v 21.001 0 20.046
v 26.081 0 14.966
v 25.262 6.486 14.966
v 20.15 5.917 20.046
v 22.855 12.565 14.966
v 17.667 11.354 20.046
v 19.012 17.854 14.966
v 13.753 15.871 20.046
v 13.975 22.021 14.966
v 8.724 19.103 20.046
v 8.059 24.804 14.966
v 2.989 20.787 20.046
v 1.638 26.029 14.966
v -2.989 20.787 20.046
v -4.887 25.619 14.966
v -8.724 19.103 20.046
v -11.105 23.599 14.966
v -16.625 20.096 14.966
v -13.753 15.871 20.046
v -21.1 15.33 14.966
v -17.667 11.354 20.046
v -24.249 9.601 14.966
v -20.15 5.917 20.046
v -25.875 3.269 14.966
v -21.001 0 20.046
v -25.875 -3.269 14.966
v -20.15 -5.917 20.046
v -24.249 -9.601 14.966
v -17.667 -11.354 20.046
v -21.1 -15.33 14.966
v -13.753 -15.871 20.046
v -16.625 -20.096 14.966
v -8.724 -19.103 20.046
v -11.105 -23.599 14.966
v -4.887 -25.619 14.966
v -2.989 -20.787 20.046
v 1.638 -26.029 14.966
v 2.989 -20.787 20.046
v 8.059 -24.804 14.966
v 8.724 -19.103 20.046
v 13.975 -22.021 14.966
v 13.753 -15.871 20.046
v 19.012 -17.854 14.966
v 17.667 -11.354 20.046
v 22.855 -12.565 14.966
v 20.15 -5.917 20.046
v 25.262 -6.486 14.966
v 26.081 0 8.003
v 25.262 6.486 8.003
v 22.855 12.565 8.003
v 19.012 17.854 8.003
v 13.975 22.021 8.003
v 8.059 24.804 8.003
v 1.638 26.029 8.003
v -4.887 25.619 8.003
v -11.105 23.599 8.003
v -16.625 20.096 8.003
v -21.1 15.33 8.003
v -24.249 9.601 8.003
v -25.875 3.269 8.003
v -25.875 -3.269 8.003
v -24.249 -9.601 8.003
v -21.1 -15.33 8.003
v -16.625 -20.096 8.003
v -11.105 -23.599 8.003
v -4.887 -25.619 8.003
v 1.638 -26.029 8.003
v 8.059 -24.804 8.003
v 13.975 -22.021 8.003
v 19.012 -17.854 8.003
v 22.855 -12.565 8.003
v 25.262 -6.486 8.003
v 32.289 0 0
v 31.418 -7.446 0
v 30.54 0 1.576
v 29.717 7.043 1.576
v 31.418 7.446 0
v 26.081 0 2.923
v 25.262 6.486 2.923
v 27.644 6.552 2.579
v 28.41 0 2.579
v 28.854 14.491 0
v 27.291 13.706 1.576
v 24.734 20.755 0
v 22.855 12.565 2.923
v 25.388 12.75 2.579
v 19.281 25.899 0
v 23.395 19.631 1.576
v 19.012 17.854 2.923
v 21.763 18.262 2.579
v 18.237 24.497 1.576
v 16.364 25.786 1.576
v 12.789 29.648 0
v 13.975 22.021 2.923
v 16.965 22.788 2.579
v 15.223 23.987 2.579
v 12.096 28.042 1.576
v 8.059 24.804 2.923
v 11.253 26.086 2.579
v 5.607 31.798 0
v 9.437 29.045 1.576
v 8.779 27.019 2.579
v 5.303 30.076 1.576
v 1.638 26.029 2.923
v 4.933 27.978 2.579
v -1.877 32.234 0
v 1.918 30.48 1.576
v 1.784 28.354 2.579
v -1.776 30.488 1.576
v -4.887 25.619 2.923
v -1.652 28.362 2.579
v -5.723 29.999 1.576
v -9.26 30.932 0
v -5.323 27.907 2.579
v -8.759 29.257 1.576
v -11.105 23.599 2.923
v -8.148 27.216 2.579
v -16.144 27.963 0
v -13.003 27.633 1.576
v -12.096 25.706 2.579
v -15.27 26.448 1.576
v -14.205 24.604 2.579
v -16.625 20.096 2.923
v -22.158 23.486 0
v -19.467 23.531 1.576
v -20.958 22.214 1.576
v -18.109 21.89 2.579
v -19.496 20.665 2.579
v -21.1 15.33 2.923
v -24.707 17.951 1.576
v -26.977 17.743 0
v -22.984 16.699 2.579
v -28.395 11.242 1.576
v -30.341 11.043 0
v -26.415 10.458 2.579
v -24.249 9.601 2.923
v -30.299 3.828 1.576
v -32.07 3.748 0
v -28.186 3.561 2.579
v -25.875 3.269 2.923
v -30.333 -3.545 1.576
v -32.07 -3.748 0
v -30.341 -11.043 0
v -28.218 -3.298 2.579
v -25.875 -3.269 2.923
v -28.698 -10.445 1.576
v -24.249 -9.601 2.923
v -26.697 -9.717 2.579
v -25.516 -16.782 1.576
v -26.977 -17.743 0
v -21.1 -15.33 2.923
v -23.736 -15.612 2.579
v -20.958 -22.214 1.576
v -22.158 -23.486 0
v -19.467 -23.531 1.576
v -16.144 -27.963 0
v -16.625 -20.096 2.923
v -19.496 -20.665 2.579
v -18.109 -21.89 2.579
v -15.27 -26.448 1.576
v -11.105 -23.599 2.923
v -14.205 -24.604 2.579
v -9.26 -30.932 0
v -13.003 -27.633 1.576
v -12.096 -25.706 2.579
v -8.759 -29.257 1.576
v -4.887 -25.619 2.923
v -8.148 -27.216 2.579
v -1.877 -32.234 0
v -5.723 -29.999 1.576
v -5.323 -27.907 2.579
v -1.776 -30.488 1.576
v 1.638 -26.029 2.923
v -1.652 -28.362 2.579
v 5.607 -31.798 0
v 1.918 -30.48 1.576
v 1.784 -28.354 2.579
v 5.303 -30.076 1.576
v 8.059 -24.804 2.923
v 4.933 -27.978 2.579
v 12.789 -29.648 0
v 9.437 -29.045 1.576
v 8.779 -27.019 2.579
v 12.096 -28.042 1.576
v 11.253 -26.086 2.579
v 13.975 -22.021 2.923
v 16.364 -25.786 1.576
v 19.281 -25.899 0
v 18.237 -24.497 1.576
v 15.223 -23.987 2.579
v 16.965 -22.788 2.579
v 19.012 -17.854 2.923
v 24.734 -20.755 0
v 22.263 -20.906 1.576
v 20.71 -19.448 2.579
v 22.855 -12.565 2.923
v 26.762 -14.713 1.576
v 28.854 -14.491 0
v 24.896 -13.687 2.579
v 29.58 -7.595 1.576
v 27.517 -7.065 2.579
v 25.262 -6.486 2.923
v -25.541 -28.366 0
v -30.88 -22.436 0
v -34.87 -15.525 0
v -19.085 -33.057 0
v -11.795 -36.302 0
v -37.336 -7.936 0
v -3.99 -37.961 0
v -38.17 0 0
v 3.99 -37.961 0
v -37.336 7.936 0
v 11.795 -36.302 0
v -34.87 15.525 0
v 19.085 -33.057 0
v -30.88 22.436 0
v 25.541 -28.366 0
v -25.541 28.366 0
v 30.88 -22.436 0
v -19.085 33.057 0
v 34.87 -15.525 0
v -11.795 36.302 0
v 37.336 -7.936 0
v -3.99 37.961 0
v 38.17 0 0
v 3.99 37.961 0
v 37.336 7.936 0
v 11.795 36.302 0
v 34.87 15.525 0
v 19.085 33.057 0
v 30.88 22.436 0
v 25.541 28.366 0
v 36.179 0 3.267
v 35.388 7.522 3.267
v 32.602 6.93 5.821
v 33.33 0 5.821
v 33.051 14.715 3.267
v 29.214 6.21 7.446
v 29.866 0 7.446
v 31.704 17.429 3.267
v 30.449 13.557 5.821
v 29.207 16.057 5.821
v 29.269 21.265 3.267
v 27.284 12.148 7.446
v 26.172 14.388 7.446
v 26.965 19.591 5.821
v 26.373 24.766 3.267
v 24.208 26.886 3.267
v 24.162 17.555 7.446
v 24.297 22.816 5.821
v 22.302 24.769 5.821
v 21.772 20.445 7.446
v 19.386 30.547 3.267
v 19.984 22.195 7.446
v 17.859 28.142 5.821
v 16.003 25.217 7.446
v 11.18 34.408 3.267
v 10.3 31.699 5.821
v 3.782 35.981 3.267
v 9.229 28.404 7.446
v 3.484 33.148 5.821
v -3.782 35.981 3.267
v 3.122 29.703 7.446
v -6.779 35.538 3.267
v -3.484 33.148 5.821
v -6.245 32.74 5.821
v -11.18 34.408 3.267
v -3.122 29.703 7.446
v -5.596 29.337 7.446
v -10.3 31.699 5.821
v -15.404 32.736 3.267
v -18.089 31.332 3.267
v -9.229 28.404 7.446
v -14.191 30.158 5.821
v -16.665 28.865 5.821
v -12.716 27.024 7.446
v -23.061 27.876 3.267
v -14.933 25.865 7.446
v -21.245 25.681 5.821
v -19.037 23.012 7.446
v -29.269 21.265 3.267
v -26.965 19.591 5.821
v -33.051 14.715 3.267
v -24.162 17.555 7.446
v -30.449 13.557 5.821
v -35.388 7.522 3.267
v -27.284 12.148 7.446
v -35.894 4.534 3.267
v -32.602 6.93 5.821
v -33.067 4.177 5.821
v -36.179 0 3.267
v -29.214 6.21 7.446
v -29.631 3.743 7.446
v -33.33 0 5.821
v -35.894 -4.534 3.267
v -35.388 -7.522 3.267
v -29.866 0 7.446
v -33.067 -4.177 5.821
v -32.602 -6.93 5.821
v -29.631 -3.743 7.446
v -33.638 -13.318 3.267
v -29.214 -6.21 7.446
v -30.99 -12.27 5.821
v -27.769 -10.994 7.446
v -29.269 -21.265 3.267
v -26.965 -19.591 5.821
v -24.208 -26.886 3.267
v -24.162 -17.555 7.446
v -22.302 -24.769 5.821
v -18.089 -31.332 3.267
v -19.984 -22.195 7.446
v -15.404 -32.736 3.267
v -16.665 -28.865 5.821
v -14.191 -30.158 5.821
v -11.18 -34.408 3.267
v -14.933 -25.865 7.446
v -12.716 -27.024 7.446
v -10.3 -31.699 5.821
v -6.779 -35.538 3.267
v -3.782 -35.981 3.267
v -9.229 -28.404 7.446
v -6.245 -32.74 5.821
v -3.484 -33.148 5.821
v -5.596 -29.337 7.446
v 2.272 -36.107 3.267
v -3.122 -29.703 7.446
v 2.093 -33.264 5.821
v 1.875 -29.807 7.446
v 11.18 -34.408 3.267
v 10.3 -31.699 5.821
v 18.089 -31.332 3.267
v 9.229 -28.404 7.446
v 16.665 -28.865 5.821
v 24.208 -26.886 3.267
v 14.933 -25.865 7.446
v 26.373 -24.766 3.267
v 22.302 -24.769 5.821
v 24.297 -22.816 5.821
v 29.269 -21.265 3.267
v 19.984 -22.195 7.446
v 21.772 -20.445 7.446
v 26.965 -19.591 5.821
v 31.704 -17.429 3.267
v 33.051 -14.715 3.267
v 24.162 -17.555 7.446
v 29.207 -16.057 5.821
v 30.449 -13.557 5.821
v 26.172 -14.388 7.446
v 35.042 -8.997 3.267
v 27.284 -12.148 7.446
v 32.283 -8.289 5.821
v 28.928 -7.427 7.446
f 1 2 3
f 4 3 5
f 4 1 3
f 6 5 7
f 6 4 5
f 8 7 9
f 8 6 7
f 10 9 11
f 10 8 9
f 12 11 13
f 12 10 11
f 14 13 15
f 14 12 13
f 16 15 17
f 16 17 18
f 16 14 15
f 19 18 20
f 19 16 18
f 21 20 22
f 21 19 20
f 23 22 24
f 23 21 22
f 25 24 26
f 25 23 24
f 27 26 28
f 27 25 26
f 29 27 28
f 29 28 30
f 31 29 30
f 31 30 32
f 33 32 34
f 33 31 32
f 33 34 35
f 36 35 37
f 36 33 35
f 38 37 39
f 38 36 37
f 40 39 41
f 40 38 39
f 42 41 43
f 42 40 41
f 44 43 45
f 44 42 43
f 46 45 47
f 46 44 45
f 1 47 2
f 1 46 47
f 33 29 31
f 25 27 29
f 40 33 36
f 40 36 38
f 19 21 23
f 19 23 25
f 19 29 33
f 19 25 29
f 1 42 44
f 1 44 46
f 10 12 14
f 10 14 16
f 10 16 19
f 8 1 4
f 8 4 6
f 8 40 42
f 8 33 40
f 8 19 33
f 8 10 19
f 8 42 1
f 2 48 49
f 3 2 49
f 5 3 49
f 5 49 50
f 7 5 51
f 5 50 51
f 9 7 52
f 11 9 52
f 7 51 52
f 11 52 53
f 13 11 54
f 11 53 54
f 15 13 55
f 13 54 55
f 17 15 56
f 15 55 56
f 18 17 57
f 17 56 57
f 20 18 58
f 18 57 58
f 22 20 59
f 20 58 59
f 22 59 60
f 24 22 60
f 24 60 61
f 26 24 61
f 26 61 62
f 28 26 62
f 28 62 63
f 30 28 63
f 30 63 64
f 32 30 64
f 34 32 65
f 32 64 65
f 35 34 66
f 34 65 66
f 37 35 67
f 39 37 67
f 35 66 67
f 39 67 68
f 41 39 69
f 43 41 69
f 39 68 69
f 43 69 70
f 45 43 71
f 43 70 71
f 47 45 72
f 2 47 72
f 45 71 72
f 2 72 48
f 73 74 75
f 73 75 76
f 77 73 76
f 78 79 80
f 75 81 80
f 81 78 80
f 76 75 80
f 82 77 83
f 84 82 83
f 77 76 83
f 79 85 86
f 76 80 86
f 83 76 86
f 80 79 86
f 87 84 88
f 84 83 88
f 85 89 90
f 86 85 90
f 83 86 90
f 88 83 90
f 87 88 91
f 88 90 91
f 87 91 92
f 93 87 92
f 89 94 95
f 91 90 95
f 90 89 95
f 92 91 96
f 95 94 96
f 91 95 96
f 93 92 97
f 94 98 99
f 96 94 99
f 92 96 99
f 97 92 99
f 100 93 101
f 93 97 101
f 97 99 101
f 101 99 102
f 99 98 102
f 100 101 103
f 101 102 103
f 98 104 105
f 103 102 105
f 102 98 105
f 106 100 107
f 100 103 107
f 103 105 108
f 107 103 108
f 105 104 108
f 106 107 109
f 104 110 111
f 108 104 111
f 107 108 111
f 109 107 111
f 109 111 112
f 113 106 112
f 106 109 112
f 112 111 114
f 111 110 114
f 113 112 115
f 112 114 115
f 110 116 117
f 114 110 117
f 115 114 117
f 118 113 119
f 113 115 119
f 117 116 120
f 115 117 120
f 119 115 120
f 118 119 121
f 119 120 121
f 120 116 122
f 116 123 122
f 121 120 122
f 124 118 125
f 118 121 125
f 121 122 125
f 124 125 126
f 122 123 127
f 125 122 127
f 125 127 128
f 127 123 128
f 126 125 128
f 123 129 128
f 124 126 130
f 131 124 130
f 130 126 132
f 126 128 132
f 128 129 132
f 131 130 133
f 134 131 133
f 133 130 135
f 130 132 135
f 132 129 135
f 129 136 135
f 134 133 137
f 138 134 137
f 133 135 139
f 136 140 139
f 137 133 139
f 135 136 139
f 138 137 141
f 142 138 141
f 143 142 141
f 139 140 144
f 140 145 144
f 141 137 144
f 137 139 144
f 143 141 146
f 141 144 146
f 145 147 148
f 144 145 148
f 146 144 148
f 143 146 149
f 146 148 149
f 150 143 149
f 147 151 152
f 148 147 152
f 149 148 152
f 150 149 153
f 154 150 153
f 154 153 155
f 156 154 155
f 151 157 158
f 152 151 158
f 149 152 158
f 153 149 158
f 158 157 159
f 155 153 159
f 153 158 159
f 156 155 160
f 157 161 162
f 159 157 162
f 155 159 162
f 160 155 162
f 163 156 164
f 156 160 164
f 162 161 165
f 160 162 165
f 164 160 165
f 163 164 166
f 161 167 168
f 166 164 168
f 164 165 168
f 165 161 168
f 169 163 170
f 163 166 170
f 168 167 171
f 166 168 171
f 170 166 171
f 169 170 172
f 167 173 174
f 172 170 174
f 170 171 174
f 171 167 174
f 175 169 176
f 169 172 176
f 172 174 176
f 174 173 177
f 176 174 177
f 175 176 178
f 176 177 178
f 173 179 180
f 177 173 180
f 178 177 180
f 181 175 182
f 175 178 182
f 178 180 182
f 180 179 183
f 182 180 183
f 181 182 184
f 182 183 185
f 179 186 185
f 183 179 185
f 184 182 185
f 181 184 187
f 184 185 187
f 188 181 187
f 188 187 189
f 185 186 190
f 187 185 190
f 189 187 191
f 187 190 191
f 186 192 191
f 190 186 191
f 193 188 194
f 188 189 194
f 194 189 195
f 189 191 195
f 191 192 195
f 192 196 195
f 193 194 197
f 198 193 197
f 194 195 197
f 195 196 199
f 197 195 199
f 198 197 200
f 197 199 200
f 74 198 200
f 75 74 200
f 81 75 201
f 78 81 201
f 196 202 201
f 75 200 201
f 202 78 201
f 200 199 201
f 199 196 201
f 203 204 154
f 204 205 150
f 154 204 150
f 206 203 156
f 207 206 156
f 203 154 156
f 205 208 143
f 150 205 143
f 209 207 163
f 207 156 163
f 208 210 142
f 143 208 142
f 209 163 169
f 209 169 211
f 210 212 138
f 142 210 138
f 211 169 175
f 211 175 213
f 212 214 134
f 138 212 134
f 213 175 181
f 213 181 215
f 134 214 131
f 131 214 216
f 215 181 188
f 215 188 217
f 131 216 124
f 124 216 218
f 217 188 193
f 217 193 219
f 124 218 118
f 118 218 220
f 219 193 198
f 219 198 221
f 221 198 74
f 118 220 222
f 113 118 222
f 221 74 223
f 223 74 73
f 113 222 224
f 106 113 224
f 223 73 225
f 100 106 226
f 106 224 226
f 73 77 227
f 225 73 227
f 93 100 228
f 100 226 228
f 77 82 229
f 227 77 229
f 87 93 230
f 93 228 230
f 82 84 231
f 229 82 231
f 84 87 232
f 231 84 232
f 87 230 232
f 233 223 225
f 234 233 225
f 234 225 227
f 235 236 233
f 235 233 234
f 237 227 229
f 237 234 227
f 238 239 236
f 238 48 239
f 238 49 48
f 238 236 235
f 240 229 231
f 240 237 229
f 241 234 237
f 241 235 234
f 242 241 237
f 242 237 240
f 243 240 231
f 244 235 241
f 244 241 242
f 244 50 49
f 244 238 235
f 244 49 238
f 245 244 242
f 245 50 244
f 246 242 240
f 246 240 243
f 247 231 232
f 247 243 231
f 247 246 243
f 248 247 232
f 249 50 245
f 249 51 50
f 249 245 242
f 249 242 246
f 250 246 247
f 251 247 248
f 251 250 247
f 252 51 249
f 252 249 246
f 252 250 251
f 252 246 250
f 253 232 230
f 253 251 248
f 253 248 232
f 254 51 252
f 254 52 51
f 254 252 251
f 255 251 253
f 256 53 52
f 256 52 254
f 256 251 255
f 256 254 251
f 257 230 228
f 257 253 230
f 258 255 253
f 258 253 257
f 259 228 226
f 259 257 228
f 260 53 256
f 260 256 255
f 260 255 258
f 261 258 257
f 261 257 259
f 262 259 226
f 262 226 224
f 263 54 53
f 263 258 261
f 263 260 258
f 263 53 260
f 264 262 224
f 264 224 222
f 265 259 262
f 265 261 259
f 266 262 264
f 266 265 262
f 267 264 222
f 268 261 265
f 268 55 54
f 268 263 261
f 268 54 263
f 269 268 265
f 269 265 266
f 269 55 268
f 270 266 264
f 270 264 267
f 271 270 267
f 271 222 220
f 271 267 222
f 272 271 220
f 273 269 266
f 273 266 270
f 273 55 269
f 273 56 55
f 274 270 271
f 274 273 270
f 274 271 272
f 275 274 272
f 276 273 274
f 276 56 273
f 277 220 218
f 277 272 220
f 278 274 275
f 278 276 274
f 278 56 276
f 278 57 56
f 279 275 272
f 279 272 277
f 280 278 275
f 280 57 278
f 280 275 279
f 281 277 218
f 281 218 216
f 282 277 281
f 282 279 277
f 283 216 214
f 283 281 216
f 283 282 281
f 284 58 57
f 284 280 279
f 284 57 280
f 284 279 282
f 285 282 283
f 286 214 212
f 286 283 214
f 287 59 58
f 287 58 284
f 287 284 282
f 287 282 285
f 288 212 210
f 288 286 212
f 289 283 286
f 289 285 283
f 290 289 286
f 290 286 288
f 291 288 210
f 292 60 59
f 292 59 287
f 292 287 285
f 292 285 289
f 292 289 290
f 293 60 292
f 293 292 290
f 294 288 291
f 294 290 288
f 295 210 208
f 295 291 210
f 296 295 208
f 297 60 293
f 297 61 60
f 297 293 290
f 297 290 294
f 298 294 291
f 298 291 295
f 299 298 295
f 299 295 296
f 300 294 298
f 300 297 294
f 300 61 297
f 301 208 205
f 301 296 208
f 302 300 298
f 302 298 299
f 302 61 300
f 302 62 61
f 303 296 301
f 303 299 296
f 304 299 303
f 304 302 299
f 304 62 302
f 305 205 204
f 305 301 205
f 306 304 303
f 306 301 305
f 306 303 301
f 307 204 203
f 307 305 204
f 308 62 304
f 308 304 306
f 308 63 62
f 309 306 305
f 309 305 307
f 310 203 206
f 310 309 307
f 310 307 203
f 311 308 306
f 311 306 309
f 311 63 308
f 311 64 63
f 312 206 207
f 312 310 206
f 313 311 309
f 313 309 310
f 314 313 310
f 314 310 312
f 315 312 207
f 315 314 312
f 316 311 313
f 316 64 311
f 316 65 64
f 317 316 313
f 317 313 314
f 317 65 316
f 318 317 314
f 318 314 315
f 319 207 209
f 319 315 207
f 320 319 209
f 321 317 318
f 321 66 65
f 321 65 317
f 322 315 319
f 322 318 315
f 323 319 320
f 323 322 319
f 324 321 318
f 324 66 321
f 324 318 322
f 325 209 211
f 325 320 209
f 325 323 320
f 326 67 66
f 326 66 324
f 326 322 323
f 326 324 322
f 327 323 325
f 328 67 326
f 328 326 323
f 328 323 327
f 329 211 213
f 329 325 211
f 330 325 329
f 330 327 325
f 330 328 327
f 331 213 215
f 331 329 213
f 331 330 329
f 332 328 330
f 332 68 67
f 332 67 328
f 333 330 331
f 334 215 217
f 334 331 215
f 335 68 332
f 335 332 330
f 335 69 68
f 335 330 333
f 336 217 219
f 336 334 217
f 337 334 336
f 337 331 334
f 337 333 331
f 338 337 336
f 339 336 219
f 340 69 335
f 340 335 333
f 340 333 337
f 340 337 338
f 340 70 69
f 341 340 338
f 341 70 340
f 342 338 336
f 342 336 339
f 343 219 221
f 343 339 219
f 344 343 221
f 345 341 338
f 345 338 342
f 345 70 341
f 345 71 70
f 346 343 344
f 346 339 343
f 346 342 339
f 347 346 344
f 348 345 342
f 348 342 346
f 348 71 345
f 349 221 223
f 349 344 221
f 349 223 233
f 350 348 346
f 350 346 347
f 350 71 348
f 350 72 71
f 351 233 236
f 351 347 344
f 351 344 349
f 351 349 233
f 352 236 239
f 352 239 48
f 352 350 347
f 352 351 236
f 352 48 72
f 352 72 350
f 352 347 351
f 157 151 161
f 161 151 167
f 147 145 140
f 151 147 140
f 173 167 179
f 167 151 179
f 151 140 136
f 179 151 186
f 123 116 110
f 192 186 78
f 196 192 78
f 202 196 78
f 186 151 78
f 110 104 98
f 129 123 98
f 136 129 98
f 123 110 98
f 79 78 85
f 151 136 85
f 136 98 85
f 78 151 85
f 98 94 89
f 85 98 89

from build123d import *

# Parameters (mm, degrees)
F0_R     = 38.1703800994
F1_DEPTH = 8.0033224076
F3_T     = -5.08
F4_DEPTH = 12.0424441993
F5_SIZE  = 5.08


# Not quite as in the source:
# - a fillet or chamfer that OpenCascade refuses, or shapes differently, is made with other operations: its cross-section is extruded or revolved along the edge and cut away or added


with BuildPart() as f1:
    # F0 (on Top) → F1 (new body)
    with BuildSketch(Plane.XY):
        Circle(F0_R)
    extrude(amount=F1_DEPTH)

    # F2: fillet of radius 13.1324976857 on 1 edges, made by hand

    # F2_s1 → F2_t2 (revolve, cut)
    with BuildSketch(Plane.XZ):
        with BuildLine():
            ThreePointArc((38.1703800994, 0), (33.3302233857, 5.821198641), (26.0809609061, 8.0033224076))
            Line((26.0809609061, 8.0033224076), (38.1703800994, 8.0033224076))
            Line((38.1703800994, 8.0033224076), (38.1703800994, 0))
        make_face()
    revolve(axis=Axis((0, 0, 8.0033224076), (0, 0, 1)), mode=Mode.SUBTRACT)

    # F3
    f3_openings = [f1.faces().sort_by_distance(p)[0] for p in [
        (0, 0, 0),
    ]]
    offset(amount=F3_T, openings=f3_openings)

    # F4 (add): a face of the model
    f4_faces = [f1.faces().sort_by_distance(p)[0] for p in [
        (0, 0, 8.0033224076),
    ]]
    extrude(f4_faces, amount=F4_DEPTH)

    # F5
    f5_edges = [f1.edges().sort_by_distance(p)[0] for p in [
        (-26.080961, 0, 20.045767),
    ]]
    chamfer(f5_edges, length=F5_SIZE)


solid = f1.part
